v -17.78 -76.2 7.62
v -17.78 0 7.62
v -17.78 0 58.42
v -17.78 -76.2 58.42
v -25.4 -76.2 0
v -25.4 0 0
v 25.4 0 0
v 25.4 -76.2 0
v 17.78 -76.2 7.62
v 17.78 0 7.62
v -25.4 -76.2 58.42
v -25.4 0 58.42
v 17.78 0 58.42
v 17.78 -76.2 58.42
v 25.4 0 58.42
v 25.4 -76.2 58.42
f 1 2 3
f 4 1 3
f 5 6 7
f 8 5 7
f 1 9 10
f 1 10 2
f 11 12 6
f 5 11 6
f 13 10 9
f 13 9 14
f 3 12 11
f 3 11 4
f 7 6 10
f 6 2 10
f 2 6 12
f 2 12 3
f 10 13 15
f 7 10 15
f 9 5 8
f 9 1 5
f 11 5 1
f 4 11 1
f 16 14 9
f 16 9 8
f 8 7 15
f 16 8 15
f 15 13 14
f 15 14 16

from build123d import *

# Parameters (mm, degrees)
F0_W     = 7.62
F0_H     = 50.8
F1_DEPTH = 76.2


with BuildPart() as f1:
    # F0 (on Front) → F1 (new body)
    with BuildSketch(Plane.XZ):
        Polygon((0, 7.62), (0, 0), (25.4, 0), (25.4, 7.62), (17.78, 7.62), align=None)
        Polygon((-25.4, 0), (0, 0), (0, 7.62), (-17.78, 7.62), (-25.4, 7.62), align=None)
        with Locations((21.59, 33.02)):
            Rectangle(F0_W, F0_H)
        with Locations((-21.59, 33.02)):
            Rectangle(F0_W, F0_H)
    extrude(amount=F1_DEPTH)


solid = f1.part
